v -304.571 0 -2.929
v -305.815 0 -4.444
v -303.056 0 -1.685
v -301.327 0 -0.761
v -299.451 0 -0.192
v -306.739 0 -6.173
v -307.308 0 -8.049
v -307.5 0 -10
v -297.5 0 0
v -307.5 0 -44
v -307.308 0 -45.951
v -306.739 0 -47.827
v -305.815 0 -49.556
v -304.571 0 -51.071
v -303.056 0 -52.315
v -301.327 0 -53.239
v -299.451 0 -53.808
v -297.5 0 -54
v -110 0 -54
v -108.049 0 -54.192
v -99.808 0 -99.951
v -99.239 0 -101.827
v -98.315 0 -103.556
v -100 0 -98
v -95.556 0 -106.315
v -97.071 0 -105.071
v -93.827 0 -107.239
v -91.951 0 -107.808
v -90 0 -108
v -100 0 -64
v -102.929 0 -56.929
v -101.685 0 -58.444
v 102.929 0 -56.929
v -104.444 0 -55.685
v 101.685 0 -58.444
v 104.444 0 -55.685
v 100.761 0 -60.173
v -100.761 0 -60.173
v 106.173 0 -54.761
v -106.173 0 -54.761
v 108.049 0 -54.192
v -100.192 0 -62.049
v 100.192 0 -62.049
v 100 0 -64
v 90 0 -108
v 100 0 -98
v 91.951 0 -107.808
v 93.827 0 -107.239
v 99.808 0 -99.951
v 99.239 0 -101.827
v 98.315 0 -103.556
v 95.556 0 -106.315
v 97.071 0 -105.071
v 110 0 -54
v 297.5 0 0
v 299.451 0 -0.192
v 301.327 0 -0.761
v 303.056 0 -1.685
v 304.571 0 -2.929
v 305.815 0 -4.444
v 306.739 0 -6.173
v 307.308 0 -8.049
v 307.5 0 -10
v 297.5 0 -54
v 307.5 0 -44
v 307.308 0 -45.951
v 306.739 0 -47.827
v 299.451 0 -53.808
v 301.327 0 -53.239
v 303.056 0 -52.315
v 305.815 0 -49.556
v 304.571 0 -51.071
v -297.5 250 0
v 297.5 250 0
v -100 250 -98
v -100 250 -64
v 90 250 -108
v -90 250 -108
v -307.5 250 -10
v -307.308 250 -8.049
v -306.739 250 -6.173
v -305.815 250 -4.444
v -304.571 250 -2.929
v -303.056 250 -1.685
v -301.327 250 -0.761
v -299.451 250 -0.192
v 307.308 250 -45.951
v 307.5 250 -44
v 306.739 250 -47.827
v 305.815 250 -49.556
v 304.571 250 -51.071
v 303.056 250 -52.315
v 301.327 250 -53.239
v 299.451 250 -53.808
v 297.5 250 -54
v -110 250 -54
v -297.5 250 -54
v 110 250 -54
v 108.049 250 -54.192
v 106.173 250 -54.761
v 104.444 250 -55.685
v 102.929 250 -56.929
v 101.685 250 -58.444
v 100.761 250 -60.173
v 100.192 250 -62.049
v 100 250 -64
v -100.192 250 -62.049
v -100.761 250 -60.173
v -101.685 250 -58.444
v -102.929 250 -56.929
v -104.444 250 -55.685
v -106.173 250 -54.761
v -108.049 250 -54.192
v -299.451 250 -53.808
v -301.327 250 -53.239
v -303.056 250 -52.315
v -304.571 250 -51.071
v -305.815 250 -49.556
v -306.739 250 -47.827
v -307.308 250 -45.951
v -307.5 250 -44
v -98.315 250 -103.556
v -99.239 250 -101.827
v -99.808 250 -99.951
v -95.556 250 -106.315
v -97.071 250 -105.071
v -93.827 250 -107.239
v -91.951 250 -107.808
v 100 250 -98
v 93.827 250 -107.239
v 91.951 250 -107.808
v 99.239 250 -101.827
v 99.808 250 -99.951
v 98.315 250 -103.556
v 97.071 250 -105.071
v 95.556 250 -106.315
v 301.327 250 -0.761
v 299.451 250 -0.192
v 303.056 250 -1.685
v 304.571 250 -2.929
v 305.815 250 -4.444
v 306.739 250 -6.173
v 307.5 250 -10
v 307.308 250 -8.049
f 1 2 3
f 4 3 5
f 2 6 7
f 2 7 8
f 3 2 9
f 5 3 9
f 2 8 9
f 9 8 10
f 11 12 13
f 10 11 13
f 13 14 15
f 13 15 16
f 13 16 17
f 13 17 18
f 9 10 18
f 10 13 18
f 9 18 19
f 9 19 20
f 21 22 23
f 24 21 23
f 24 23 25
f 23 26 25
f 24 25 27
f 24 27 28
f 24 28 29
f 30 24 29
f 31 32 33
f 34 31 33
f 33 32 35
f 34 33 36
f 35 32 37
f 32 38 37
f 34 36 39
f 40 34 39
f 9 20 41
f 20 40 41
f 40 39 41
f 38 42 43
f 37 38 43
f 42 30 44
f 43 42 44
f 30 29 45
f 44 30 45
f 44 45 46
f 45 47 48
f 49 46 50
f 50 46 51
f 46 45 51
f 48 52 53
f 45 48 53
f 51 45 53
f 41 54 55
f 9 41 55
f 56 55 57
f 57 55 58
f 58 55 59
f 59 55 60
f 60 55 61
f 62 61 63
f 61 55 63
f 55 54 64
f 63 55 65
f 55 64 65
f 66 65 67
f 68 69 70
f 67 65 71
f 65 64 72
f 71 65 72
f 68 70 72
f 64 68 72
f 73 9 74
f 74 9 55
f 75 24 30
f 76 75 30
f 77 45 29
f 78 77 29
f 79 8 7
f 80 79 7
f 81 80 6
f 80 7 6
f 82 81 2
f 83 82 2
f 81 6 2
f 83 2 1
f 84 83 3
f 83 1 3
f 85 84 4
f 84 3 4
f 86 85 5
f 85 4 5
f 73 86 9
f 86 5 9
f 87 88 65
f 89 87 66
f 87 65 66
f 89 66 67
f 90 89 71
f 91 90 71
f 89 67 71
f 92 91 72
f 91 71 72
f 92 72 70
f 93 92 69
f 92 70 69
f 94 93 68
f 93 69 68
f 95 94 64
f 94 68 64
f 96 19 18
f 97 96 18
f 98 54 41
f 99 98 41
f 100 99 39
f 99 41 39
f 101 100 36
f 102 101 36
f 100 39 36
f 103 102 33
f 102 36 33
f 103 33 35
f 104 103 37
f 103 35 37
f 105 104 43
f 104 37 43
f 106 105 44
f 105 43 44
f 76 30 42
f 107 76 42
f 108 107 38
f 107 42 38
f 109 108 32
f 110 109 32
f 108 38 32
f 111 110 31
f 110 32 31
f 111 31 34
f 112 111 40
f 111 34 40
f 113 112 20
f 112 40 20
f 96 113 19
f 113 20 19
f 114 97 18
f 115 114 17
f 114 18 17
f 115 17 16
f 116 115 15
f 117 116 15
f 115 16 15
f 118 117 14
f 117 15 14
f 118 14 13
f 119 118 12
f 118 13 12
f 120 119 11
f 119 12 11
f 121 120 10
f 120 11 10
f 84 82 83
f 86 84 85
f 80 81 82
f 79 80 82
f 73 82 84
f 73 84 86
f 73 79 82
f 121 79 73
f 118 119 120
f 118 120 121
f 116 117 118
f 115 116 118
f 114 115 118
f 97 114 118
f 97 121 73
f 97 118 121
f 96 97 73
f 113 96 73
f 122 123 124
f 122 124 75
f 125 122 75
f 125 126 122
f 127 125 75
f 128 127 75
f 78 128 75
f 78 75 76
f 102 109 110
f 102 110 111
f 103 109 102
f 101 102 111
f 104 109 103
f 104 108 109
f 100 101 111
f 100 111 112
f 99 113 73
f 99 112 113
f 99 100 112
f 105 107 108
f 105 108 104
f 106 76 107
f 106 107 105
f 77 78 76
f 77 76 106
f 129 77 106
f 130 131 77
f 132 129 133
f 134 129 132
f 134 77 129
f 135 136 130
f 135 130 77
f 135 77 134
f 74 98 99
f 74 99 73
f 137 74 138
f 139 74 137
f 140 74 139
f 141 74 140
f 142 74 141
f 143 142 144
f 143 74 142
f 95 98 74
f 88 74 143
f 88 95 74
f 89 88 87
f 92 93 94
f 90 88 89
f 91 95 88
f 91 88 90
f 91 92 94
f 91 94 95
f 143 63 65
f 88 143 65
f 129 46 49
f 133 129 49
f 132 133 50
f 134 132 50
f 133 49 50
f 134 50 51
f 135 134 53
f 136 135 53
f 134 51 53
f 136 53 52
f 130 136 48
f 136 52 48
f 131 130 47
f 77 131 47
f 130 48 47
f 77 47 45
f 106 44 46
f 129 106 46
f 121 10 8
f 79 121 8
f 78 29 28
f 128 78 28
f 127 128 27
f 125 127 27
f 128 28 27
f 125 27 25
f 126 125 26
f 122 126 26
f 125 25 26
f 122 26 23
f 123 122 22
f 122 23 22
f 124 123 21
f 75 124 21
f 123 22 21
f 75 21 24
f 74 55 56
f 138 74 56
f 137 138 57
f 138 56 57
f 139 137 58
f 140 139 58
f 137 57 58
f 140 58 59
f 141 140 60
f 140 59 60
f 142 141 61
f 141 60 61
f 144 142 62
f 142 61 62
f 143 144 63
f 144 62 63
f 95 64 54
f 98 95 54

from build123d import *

# Parameters (mm, degrees)
EXTRUDE_1_DEPTH = 250


with BuildPart() as part:
    # 草图1 → 凸台-拉伸1 (new body)
    with BuildSketch(Plane(origin=(0, 0, 0), x_dir=(1, 0, 0), z_dir=(0, 1, 0))):
        with BuildLine():
            Line((-297.5, 0), (297.5, 0))
            ThreePointArc((297.5, 0), (304.571067812, 2.928932188), (307.5, 10))
            Line((307.5, 10), (307.5, 44))
            ThreePointArc((307.5, 44), (304.571067812, 51.071067812), (297.5, 54))
            Line((297.5, 54), (110, 54))
            ThreePointArc((110, 54), (102.928932188, 56.928932188), (100, 64))
            Line((100, 64), (100, 98))
            ThreePointArc((100, 98), (97.071067812, 105.071067812), (90, 108))
            Line((90, 108), (-90, 108))
            ThreePointArc((-90, 108), (-97.071067812, 105.071067812), (-100, 98))
            Line((-100, 98), (-100, 64))
            ThreePointArc((-100, 64), (-102.928932188, 56.928932188), (-110, 54))
            Line((-110, 54), (-297.5, 54))
            ThreePointArc((-297.5, 54), (-304.571067812, 51.071067812), (-307.5, 44))
            Line((-307.5, 44), (-307.5, 10))
            ThreePointArc((-307.5, 10), (-304.571067812, 2.928932188), (-297.5, 0))
        make_face()
    extrude(amount=EXTRUDE_1_DEPTH)


solid = part.part
